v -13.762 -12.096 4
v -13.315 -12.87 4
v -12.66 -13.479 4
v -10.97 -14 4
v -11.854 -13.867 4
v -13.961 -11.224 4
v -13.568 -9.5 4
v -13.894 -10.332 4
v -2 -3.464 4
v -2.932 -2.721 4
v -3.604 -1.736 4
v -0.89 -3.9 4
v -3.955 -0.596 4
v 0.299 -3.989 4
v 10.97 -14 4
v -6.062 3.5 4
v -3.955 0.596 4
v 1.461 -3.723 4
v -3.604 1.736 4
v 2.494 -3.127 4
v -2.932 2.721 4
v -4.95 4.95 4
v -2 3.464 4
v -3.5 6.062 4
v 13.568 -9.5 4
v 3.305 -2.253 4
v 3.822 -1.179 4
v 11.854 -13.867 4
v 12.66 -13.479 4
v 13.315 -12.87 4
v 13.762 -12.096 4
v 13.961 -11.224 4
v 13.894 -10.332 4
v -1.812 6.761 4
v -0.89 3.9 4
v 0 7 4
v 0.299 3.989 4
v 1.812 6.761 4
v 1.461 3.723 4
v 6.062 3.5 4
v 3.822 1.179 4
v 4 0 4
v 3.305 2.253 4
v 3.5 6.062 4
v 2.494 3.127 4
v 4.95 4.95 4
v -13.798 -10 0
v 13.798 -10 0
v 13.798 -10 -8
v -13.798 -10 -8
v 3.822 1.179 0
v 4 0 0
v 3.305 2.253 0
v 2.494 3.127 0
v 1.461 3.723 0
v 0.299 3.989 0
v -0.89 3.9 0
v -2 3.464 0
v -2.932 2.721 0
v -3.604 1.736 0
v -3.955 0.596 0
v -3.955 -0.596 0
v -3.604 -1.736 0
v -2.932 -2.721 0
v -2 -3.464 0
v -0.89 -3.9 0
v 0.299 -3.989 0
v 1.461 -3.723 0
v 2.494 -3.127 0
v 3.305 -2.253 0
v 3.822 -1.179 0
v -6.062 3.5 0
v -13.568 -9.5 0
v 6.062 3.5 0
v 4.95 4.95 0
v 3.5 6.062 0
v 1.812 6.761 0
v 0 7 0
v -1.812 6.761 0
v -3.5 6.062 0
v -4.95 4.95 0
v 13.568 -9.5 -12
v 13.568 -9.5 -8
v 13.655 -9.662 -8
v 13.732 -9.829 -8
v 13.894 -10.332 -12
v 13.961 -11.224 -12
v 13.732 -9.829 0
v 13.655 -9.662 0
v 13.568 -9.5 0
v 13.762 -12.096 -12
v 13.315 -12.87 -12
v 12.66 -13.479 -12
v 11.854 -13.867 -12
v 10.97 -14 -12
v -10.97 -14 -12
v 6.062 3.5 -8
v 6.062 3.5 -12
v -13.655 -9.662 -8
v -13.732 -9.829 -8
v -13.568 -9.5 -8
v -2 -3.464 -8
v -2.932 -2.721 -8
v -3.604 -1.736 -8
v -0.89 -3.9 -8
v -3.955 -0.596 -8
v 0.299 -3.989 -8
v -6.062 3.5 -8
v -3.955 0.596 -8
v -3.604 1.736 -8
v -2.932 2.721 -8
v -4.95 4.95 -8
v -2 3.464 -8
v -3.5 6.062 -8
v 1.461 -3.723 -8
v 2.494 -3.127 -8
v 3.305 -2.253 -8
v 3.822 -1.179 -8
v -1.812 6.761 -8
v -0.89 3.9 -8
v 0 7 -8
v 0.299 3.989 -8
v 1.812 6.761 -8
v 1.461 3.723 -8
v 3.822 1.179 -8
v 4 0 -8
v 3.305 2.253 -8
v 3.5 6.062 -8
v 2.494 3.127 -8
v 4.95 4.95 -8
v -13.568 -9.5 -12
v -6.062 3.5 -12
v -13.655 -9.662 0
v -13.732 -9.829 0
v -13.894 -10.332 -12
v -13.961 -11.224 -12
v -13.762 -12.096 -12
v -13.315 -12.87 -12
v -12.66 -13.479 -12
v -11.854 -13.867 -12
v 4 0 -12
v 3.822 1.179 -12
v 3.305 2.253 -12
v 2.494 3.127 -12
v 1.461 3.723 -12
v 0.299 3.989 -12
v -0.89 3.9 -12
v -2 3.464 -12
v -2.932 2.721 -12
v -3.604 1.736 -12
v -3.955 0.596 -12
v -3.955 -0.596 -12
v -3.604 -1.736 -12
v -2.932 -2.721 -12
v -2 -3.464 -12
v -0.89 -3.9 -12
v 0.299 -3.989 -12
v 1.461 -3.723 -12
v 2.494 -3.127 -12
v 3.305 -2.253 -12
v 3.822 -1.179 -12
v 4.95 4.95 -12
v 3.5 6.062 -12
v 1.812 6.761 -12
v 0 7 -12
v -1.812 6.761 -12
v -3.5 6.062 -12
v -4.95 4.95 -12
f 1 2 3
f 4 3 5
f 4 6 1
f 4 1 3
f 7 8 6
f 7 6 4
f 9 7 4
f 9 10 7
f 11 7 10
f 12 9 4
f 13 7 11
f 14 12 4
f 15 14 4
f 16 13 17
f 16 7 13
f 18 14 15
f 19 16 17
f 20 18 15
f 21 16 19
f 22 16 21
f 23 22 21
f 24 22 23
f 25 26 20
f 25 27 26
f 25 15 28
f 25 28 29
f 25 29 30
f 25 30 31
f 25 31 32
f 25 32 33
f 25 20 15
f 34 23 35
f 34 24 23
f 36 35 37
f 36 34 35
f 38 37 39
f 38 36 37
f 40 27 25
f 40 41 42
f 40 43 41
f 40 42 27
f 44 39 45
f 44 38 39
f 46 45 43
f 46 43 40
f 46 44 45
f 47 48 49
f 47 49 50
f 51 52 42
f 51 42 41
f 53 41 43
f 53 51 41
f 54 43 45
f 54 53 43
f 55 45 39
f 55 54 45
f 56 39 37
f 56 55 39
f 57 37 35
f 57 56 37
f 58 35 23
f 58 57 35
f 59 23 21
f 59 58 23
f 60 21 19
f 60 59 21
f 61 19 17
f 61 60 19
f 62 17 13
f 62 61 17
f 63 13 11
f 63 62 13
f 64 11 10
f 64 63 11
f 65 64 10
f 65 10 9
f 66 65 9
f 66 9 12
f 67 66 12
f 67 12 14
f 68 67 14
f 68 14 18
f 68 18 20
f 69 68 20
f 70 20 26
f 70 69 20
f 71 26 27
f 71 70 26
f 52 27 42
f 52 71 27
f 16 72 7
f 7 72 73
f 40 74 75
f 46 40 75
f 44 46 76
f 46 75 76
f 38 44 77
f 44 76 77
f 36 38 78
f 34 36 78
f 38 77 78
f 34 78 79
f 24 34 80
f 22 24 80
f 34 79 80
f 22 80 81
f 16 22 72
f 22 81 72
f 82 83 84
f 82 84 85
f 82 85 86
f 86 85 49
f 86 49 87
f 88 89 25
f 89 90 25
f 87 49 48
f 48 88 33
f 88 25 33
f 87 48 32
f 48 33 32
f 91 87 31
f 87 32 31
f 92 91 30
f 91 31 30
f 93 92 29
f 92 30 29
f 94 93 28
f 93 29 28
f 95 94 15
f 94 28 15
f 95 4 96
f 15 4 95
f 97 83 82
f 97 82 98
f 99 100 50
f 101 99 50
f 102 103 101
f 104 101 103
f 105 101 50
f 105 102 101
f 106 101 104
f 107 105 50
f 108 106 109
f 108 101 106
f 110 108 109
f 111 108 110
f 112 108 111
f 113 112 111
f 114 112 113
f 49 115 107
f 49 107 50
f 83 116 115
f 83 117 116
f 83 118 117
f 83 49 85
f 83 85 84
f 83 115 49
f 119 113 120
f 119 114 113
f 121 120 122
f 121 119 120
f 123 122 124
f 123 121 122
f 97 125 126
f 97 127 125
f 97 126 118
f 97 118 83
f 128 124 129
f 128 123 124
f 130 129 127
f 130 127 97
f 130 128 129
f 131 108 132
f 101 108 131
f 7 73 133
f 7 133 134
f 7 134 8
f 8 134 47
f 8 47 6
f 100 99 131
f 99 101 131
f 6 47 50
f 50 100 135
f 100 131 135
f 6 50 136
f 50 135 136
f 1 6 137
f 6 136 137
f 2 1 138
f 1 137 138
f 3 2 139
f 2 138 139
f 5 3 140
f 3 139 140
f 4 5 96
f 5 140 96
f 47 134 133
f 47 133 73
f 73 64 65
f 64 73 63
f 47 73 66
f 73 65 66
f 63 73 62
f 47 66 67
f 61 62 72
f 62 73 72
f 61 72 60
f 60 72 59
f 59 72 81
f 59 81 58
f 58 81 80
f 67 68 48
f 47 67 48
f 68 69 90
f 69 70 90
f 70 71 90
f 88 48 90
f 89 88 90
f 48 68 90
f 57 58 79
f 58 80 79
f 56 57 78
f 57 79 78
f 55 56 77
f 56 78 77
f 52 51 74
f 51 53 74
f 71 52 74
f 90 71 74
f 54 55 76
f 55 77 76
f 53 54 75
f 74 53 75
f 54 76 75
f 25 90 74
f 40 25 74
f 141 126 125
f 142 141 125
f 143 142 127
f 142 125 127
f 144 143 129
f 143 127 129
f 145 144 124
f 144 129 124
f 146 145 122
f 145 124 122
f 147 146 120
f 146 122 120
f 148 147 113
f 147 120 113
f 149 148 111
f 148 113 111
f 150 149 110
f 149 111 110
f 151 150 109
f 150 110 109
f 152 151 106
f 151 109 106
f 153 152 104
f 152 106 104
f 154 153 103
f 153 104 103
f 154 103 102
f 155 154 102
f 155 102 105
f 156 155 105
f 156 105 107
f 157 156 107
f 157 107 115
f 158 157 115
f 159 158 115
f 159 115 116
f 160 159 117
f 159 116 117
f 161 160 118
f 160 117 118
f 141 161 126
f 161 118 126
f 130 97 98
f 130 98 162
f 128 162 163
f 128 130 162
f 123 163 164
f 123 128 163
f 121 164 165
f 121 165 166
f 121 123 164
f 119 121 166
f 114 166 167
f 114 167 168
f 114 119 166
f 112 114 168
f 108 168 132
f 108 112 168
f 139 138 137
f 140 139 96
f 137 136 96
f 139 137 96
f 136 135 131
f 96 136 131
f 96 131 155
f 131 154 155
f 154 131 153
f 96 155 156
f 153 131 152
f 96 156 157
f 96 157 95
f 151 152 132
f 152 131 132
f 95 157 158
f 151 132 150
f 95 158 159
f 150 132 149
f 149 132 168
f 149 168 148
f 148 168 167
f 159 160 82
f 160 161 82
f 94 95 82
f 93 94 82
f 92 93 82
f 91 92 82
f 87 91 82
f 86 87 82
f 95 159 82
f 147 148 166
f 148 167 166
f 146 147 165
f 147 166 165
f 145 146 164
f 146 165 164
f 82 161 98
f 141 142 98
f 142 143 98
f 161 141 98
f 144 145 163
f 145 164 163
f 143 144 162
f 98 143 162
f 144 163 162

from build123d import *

# Parameters (mm, degrees)
SKETCH1_R           = 4
MAINBODY_DEPTH      = 4
BOSS_EXTRUDE2_DEPTH = 8
FILLET1_R           = 3


with BuildPart() as part:
    # Sketch1 → MainBody (new body)
    with BuildSketch(Plane.XY):
        with BuildLine():
            Line((-6.062177826, 3.5), (-16.165807537, -14))
            Line((-16.165807537, -14), (16.165807537, -14))
            Line((16.165807537, -14), (6.062177826, 3.5))
            ThreePointArc((6.062177826, 3.5), (0, 7), (-6.062177826, 3.5))
        make_face()
        Circle(SKETCH1_R, mode=Mode.SUBTRACT)
    mainbody = extrude(amount=MAINBODY_DEPTH)

    # Sketch3 → Boss-Extrude2 (add)
    with BuildSketch(Plane(origin=(0, 0, 0), x_dir=(-1, 0, 0), z_dir=(0, 0, -1))):
        Polygon((-16.165807537, -14), (-13.856406461, -10), (13.856406461, -10), (16.165807537, -14), align=None)
    extrude(amount=BOSS_EXTRUDE2_DEPTH)

    # Mirror2: MainBody across plane
    add(mainbody.mirror(Plane(origin=(0, 0, -4), x_dir=(1, 0, 0), z_dir=(0, 0, -1))))

    # Fillet1
    # the kernel refuses this fillet: 3 mm, written as the material it takes off along each edge
    with BuildSketch(Plane(origin=(-16.165807537, -14, -24.990381057), x_dir=(1, 0, 0), z_dir=(0, 0, 1)), Plane(origin=(16.165807537, -14, 16.990381057), x_dir=(-1, 0, 0), z_dir=(0, 0, -1))) as fillet1_piece_1:
        with BuildLine():
            CenterArc((FILLET1_R * 1.73205080757, FILLET1_R), FILLET1_R, 150, 120)
            Line((FILLET1_R * 0.866025403784, FILLET1_R * 1.5), (0, 0))
            Line((0, 0), (FILLET1_R * 1.73205080757, 0))
        make_face()
    extrude(amount=41.980762114, mode=Mode.SUBTRACT)


solid = part.part
